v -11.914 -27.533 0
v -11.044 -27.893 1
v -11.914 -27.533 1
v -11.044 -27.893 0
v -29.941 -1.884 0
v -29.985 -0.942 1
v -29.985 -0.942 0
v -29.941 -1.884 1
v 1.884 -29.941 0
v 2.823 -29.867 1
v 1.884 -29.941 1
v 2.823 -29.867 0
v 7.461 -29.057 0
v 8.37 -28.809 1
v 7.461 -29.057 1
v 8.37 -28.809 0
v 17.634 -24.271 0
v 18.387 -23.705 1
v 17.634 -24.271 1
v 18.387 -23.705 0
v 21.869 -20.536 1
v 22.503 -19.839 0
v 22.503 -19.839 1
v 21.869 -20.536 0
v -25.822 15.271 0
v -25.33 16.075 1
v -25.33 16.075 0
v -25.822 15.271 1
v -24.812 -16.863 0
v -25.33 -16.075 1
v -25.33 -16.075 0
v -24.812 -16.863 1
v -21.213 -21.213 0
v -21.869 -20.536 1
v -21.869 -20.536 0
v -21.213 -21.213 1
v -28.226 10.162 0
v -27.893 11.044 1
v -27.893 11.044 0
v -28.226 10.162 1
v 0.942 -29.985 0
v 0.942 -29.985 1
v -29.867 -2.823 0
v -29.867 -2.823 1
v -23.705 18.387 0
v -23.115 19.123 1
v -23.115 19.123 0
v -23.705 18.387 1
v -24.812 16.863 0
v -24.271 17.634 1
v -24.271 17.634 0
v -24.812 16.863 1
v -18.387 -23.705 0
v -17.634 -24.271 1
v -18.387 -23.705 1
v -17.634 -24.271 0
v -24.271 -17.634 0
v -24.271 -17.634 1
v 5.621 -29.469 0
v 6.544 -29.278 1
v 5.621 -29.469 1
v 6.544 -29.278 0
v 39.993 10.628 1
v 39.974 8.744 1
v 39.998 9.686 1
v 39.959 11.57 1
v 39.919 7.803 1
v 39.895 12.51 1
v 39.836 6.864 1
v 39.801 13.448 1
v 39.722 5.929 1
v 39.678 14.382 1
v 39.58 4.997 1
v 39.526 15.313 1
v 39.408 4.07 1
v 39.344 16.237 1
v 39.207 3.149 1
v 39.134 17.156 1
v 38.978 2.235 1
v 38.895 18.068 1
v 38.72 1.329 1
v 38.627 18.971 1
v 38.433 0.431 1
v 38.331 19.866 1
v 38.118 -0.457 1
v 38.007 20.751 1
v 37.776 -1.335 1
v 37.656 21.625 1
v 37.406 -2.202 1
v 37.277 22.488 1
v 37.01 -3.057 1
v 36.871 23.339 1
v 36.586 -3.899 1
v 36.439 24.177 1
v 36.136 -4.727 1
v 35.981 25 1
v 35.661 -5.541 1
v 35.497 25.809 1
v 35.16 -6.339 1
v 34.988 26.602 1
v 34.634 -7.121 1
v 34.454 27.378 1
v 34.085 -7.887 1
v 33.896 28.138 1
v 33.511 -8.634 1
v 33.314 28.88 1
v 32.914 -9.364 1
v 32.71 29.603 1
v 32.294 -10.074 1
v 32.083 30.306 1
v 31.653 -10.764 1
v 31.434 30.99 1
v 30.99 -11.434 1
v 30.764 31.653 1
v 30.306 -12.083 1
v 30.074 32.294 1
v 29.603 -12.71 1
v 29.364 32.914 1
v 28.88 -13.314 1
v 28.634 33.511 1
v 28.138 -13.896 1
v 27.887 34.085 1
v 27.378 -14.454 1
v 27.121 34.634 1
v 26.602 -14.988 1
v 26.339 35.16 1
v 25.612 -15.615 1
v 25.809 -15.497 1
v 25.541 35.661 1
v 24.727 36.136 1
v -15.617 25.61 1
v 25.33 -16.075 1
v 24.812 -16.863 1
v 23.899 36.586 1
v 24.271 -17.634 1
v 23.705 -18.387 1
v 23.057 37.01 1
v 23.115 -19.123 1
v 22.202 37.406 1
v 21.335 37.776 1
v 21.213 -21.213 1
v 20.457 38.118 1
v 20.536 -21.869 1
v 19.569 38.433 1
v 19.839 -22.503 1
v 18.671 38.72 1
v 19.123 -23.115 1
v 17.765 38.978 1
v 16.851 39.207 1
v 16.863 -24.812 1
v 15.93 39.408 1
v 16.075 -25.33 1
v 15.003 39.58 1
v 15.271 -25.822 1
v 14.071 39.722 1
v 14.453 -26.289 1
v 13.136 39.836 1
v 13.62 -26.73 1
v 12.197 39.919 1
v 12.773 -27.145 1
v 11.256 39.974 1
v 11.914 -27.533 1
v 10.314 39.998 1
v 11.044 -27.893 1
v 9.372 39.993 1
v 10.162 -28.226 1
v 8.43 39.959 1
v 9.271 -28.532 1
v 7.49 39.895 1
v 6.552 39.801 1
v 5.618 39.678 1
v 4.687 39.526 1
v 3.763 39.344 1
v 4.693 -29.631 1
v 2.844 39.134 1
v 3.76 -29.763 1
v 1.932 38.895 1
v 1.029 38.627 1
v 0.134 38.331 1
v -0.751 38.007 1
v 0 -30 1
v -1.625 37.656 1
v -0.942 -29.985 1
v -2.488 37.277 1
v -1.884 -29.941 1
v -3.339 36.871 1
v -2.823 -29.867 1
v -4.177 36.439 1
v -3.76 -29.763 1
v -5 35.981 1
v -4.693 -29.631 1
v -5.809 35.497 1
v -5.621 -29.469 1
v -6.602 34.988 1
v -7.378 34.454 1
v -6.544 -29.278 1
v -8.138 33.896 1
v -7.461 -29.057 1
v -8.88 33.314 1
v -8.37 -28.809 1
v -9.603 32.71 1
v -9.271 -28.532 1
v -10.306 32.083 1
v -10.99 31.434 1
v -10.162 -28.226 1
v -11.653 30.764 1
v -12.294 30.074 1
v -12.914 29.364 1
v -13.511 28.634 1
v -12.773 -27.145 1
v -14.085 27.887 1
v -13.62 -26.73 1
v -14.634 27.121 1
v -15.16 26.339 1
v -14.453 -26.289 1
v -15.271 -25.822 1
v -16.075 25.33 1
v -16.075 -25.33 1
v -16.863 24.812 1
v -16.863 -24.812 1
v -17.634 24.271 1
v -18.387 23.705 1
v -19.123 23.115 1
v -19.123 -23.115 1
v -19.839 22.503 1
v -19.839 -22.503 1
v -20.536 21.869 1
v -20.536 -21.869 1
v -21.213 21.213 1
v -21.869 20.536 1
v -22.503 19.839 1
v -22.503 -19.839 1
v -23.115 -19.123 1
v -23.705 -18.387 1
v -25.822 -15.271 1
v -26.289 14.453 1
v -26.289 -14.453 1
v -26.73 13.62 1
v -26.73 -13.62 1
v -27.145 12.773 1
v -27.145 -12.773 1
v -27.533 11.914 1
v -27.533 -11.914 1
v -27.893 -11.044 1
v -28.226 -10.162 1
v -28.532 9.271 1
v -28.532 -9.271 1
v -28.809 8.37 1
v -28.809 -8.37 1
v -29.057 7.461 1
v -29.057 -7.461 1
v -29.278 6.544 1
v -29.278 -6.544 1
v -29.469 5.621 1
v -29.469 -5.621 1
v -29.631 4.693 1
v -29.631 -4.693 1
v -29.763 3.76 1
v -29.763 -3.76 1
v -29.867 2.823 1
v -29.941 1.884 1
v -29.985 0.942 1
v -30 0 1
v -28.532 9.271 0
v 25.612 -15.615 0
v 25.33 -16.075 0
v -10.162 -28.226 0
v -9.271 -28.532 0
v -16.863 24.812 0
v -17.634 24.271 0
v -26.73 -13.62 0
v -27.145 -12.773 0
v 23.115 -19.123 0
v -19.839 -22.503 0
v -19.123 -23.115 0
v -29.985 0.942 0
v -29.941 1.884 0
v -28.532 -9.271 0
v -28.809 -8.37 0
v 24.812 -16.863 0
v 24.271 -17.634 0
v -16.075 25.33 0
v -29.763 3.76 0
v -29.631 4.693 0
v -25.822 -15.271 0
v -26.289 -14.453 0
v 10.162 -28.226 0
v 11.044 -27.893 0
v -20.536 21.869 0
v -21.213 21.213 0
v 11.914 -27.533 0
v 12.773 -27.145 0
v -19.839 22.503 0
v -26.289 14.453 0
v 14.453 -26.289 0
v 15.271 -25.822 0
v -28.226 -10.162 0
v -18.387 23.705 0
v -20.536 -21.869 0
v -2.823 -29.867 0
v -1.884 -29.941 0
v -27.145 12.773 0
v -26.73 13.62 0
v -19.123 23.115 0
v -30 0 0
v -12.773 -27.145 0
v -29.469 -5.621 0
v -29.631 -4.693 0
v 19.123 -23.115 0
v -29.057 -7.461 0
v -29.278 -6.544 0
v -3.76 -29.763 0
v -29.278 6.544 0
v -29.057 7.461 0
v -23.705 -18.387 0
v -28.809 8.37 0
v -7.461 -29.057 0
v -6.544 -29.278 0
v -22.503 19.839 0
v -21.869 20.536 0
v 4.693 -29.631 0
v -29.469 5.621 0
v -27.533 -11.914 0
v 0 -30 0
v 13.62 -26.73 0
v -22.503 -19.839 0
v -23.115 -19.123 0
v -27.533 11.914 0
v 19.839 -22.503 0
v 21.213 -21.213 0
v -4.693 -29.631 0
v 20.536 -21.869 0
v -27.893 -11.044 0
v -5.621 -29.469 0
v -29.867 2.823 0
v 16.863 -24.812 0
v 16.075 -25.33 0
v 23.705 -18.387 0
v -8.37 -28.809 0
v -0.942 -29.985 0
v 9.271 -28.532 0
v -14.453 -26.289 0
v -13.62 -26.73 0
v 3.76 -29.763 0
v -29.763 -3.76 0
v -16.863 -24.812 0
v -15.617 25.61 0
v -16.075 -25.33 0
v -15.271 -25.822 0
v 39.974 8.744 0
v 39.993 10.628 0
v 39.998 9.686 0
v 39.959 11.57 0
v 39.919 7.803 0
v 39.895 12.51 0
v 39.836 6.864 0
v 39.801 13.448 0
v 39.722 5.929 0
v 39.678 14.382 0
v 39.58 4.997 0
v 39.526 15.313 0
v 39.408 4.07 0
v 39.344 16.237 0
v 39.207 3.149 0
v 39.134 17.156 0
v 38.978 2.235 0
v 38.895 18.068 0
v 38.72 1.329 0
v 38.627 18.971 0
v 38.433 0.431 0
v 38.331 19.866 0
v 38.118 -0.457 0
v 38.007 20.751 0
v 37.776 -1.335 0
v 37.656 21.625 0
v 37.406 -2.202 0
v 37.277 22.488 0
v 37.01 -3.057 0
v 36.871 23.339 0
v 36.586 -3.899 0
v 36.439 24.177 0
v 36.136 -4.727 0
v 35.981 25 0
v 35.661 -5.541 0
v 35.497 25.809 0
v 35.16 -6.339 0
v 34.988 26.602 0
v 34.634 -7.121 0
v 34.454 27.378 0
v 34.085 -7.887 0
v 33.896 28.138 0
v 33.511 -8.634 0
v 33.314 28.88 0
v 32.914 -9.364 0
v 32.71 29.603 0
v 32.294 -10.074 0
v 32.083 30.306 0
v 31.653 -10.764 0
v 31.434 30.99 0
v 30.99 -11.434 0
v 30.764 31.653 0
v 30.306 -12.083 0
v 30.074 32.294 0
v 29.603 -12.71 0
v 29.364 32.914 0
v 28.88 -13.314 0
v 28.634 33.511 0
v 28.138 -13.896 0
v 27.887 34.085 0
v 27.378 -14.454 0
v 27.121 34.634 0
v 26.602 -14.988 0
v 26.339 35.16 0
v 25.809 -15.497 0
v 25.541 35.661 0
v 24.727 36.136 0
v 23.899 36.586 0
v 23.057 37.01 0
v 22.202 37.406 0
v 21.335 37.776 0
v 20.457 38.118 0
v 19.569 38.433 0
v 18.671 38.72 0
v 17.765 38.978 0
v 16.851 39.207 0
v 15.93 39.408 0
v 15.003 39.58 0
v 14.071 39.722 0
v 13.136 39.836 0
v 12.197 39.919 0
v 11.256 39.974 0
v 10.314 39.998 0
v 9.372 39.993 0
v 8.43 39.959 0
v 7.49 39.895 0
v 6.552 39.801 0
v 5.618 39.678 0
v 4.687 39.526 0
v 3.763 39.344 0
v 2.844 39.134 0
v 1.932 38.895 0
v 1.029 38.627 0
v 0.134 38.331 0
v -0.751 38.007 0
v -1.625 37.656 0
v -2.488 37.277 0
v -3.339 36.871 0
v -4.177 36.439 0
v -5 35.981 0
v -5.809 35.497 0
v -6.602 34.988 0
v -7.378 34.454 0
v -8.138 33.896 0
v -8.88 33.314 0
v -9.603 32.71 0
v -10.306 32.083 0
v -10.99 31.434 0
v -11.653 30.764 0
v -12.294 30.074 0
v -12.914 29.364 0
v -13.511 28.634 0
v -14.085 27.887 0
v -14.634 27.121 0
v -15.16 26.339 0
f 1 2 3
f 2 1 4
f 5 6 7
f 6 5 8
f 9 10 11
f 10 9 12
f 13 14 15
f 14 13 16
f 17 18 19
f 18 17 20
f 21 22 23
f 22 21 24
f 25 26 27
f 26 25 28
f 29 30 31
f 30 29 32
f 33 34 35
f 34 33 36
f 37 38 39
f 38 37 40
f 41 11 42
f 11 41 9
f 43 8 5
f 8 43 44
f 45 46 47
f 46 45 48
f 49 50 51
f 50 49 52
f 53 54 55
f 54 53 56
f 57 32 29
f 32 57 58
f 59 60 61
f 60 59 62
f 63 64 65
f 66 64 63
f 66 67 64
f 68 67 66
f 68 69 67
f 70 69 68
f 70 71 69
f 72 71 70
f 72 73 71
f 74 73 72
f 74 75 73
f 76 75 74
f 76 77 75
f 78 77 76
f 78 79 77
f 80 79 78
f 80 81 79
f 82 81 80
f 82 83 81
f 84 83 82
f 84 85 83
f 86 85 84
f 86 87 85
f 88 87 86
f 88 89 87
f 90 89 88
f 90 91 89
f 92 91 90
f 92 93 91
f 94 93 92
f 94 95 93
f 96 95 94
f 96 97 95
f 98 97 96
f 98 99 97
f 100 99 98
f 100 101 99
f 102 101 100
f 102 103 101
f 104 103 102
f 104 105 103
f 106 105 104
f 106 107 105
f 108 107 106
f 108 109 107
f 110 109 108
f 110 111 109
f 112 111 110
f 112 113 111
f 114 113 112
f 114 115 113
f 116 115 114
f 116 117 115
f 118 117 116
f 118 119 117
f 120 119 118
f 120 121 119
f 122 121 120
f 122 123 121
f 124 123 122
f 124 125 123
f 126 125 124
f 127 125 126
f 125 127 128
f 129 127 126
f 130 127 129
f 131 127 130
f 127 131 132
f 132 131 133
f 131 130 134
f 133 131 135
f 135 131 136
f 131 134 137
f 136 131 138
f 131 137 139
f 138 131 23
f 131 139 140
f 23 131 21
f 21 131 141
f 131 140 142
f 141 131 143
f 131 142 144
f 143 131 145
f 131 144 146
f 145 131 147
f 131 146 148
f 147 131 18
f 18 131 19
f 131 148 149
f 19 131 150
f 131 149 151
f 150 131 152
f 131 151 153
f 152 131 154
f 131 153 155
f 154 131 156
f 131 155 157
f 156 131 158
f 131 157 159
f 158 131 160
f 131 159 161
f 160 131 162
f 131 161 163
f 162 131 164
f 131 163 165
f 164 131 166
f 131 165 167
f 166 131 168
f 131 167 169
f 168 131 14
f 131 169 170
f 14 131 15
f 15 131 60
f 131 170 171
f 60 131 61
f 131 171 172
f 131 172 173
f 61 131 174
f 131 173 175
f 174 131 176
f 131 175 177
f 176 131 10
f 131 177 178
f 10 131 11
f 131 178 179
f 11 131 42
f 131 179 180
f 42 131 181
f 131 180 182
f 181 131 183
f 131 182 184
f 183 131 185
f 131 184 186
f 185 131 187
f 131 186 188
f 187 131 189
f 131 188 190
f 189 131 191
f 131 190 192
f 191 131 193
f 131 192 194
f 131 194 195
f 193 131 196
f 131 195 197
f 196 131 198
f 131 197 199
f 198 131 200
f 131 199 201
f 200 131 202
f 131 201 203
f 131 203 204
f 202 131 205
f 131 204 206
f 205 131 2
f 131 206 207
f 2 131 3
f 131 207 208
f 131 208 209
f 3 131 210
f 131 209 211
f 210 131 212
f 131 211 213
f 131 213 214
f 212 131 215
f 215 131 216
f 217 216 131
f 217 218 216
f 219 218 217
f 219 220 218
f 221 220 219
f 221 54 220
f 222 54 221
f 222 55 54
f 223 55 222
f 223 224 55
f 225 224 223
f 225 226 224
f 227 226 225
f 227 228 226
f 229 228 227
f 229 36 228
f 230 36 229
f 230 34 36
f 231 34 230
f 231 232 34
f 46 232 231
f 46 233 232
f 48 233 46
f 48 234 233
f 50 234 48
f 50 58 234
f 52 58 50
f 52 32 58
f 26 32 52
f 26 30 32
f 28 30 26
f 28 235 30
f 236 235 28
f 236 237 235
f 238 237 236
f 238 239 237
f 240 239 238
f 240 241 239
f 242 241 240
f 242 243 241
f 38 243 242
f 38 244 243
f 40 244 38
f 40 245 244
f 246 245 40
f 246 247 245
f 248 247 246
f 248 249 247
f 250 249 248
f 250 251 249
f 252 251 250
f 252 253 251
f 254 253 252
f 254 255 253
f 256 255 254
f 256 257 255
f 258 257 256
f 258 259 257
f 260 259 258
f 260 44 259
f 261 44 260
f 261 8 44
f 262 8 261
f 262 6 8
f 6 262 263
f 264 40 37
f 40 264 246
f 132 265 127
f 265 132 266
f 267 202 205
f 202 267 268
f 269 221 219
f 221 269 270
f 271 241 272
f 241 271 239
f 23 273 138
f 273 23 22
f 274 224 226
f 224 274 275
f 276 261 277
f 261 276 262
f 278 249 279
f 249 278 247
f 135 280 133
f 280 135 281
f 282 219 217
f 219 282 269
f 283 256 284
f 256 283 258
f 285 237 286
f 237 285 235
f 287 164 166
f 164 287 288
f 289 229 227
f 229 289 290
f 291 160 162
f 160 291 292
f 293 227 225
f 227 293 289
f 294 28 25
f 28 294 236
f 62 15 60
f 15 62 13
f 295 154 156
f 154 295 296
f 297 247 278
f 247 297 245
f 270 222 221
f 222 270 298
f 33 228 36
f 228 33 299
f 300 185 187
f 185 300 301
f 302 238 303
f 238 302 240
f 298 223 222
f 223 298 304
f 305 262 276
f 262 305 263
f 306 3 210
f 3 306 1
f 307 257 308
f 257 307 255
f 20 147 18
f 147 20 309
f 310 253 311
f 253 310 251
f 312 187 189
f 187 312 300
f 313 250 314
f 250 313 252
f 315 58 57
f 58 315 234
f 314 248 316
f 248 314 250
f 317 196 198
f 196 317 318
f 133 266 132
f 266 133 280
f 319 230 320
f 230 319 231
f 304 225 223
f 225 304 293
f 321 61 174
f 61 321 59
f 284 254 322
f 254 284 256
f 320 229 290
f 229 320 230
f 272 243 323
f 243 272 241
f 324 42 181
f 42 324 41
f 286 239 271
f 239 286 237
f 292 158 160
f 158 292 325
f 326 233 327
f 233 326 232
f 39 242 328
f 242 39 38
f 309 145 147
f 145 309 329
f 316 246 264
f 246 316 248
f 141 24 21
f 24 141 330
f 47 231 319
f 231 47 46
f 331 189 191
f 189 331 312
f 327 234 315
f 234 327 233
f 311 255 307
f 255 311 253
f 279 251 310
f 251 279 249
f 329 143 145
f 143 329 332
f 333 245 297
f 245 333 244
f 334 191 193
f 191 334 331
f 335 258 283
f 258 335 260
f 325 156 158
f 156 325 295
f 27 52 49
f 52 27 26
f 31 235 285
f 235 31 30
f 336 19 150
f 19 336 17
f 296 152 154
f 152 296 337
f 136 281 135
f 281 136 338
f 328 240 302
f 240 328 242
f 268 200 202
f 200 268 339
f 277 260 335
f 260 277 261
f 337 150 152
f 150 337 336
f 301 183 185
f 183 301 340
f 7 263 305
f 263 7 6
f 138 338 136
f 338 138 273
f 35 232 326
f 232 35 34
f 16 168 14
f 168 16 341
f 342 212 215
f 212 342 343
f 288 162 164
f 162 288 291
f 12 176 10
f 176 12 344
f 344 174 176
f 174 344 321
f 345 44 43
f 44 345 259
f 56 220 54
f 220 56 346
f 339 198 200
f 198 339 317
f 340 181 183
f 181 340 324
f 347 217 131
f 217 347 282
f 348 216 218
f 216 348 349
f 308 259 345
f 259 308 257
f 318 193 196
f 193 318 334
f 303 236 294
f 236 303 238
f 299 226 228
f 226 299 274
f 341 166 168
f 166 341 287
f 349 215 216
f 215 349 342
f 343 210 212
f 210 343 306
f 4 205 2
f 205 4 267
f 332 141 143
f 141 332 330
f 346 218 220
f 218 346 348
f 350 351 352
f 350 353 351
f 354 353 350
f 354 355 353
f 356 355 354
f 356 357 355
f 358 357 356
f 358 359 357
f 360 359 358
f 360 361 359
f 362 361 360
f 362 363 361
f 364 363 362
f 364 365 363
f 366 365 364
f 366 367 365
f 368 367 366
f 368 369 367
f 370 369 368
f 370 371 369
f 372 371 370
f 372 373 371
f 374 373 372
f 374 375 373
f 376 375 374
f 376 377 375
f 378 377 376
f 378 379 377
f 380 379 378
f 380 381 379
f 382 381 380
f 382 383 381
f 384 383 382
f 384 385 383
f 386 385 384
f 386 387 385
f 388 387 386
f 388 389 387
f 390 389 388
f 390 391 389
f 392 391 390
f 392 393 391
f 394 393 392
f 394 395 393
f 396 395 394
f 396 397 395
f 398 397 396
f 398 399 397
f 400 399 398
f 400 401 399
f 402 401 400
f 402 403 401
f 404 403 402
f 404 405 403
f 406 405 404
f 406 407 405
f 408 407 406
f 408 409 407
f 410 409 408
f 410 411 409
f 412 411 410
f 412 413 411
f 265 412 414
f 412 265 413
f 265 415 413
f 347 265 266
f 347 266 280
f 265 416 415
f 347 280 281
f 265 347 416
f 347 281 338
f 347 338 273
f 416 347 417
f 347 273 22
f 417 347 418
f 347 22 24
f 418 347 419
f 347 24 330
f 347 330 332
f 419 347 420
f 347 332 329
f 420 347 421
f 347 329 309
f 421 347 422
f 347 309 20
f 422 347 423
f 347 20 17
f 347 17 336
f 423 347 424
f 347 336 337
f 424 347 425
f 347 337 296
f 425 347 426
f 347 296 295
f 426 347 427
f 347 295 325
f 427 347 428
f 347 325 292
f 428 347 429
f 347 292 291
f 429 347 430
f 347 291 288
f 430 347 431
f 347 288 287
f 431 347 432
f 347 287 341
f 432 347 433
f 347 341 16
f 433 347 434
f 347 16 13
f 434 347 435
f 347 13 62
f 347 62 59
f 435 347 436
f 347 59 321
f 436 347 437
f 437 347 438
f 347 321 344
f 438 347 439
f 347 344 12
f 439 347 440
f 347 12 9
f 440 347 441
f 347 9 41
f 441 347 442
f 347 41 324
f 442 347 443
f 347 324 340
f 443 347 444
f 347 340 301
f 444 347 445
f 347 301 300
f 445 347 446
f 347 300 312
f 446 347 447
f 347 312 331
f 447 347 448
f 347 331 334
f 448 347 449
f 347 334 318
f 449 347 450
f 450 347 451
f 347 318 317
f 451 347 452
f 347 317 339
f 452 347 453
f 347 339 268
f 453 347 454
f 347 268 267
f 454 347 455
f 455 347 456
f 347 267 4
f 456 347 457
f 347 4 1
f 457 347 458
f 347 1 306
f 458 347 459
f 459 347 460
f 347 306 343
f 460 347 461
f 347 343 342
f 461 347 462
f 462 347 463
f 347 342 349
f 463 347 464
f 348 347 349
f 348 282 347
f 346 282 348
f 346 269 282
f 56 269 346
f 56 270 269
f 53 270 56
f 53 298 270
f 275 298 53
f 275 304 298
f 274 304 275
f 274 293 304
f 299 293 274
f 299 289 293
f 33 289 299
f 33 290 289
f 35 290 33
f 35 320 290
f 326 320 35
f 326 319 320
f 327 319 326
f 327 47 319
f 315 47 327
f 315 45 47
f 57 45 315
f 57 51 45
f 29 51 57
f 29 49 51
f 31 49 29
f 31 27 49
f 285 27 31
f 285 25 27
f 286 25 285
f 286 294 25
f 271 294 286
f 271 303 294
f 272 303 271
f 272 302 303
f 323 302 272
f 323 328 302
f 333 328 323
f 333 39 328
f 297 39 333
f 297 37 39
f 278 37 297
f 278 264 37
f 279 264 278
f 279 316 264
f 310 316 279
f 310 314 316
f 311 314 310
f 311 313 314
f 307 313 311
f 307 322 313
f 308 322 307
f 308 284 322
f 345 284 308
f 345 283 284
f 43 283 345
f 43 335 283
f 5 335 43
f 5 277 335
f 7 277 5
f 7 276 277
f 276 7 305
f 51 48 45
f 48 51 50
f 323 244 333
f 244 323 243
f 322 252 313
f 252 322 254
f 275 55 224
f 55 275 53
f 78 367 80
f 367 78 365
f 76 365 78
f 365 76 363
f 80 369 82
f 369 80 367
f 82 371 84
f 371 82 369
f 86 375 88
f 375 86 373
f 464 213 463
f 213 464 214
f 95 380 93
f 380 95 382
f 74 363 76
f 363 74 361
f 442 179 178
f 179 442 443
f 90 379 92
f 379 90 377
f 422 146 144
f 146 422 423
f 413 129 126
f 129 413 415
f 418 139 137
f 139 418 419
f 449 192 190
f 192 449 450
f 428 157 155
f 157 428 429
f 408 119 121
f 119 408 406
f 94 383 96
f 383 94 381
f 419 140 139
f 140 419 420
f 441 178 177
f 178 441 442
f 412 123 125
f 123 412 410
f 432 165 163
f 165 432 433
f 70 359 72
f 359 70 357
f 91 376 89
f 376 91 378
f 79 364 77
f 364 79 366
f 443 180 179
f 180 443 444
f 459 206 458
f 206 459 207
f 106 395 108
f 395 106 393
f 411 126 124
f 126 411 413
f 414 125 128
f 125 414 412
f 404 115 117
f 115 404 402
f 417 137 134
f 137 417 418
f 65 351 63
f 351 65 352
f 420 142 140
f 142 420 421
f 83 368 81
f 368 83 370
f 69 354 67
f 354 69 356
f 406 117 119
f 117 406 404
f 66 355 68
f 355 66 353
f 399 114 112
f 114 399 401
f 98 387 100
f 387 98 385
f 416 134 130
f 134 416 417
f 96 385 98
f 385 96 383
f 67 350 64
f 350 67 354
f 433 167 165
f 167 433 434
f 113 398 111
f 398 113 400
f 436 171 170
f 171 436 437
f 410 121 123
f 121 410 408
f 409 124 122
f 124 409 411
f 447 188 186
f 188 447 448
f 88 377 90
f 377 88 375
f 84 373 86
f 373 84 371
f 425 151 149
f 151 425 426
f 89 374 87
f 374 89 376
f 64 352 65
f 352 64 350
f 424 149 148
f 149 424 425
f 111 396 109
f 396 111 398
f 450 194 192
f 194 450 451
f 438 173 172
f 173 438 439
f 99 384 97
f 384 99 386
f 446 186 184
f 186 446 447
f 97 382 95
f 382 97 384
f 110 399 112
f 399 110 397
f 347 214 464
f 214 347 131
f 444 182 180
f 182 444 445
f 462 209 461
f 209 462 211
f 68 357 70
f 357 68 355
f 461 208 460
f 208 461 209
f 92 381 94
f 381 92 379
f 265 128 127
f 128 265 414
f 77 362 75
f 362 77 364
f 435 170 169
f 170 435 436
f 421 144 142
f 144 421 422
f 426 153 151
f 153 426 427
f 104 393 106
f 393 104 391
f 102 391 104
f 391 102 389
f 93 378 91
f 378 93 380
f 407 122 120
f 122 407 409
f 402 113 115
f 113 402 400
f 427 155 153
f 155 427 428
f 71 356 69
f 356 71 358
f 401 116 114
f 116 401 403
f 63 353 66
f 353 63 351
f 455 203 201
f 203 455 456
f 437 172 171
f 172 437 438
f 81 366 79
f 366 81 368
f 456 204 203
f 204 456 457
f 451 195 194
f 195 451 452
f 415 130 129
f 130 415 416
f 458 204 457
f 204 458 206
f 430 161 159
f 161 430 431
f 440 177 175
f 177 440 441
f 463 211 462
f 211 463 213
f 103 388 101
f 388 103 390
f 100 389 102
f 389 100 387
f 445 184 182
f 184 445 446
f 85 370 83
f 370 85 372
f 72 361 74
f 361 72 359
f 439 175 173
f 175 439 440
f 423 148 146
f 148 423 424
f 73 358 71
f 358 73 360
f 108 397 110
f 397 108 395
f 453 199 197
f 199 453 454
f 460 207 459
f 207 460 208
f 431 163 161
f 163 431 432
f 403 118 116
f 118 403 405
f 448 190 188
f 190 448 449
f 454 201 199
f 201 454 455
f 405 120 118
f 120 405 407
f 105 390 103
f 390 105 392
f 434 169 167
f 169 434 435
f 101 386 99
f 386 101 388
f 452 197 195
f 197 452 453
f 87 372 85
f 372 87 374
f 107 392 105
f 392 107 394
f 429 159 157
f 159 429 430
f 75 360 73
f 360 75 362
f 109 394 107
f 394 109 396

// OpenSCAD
union() {
   cylinder(r=30,h=1,$fn=200);
   translate([10,10,0])
      rotate(12)
         cylinder(r=30,h=1,$fn=200);
}
